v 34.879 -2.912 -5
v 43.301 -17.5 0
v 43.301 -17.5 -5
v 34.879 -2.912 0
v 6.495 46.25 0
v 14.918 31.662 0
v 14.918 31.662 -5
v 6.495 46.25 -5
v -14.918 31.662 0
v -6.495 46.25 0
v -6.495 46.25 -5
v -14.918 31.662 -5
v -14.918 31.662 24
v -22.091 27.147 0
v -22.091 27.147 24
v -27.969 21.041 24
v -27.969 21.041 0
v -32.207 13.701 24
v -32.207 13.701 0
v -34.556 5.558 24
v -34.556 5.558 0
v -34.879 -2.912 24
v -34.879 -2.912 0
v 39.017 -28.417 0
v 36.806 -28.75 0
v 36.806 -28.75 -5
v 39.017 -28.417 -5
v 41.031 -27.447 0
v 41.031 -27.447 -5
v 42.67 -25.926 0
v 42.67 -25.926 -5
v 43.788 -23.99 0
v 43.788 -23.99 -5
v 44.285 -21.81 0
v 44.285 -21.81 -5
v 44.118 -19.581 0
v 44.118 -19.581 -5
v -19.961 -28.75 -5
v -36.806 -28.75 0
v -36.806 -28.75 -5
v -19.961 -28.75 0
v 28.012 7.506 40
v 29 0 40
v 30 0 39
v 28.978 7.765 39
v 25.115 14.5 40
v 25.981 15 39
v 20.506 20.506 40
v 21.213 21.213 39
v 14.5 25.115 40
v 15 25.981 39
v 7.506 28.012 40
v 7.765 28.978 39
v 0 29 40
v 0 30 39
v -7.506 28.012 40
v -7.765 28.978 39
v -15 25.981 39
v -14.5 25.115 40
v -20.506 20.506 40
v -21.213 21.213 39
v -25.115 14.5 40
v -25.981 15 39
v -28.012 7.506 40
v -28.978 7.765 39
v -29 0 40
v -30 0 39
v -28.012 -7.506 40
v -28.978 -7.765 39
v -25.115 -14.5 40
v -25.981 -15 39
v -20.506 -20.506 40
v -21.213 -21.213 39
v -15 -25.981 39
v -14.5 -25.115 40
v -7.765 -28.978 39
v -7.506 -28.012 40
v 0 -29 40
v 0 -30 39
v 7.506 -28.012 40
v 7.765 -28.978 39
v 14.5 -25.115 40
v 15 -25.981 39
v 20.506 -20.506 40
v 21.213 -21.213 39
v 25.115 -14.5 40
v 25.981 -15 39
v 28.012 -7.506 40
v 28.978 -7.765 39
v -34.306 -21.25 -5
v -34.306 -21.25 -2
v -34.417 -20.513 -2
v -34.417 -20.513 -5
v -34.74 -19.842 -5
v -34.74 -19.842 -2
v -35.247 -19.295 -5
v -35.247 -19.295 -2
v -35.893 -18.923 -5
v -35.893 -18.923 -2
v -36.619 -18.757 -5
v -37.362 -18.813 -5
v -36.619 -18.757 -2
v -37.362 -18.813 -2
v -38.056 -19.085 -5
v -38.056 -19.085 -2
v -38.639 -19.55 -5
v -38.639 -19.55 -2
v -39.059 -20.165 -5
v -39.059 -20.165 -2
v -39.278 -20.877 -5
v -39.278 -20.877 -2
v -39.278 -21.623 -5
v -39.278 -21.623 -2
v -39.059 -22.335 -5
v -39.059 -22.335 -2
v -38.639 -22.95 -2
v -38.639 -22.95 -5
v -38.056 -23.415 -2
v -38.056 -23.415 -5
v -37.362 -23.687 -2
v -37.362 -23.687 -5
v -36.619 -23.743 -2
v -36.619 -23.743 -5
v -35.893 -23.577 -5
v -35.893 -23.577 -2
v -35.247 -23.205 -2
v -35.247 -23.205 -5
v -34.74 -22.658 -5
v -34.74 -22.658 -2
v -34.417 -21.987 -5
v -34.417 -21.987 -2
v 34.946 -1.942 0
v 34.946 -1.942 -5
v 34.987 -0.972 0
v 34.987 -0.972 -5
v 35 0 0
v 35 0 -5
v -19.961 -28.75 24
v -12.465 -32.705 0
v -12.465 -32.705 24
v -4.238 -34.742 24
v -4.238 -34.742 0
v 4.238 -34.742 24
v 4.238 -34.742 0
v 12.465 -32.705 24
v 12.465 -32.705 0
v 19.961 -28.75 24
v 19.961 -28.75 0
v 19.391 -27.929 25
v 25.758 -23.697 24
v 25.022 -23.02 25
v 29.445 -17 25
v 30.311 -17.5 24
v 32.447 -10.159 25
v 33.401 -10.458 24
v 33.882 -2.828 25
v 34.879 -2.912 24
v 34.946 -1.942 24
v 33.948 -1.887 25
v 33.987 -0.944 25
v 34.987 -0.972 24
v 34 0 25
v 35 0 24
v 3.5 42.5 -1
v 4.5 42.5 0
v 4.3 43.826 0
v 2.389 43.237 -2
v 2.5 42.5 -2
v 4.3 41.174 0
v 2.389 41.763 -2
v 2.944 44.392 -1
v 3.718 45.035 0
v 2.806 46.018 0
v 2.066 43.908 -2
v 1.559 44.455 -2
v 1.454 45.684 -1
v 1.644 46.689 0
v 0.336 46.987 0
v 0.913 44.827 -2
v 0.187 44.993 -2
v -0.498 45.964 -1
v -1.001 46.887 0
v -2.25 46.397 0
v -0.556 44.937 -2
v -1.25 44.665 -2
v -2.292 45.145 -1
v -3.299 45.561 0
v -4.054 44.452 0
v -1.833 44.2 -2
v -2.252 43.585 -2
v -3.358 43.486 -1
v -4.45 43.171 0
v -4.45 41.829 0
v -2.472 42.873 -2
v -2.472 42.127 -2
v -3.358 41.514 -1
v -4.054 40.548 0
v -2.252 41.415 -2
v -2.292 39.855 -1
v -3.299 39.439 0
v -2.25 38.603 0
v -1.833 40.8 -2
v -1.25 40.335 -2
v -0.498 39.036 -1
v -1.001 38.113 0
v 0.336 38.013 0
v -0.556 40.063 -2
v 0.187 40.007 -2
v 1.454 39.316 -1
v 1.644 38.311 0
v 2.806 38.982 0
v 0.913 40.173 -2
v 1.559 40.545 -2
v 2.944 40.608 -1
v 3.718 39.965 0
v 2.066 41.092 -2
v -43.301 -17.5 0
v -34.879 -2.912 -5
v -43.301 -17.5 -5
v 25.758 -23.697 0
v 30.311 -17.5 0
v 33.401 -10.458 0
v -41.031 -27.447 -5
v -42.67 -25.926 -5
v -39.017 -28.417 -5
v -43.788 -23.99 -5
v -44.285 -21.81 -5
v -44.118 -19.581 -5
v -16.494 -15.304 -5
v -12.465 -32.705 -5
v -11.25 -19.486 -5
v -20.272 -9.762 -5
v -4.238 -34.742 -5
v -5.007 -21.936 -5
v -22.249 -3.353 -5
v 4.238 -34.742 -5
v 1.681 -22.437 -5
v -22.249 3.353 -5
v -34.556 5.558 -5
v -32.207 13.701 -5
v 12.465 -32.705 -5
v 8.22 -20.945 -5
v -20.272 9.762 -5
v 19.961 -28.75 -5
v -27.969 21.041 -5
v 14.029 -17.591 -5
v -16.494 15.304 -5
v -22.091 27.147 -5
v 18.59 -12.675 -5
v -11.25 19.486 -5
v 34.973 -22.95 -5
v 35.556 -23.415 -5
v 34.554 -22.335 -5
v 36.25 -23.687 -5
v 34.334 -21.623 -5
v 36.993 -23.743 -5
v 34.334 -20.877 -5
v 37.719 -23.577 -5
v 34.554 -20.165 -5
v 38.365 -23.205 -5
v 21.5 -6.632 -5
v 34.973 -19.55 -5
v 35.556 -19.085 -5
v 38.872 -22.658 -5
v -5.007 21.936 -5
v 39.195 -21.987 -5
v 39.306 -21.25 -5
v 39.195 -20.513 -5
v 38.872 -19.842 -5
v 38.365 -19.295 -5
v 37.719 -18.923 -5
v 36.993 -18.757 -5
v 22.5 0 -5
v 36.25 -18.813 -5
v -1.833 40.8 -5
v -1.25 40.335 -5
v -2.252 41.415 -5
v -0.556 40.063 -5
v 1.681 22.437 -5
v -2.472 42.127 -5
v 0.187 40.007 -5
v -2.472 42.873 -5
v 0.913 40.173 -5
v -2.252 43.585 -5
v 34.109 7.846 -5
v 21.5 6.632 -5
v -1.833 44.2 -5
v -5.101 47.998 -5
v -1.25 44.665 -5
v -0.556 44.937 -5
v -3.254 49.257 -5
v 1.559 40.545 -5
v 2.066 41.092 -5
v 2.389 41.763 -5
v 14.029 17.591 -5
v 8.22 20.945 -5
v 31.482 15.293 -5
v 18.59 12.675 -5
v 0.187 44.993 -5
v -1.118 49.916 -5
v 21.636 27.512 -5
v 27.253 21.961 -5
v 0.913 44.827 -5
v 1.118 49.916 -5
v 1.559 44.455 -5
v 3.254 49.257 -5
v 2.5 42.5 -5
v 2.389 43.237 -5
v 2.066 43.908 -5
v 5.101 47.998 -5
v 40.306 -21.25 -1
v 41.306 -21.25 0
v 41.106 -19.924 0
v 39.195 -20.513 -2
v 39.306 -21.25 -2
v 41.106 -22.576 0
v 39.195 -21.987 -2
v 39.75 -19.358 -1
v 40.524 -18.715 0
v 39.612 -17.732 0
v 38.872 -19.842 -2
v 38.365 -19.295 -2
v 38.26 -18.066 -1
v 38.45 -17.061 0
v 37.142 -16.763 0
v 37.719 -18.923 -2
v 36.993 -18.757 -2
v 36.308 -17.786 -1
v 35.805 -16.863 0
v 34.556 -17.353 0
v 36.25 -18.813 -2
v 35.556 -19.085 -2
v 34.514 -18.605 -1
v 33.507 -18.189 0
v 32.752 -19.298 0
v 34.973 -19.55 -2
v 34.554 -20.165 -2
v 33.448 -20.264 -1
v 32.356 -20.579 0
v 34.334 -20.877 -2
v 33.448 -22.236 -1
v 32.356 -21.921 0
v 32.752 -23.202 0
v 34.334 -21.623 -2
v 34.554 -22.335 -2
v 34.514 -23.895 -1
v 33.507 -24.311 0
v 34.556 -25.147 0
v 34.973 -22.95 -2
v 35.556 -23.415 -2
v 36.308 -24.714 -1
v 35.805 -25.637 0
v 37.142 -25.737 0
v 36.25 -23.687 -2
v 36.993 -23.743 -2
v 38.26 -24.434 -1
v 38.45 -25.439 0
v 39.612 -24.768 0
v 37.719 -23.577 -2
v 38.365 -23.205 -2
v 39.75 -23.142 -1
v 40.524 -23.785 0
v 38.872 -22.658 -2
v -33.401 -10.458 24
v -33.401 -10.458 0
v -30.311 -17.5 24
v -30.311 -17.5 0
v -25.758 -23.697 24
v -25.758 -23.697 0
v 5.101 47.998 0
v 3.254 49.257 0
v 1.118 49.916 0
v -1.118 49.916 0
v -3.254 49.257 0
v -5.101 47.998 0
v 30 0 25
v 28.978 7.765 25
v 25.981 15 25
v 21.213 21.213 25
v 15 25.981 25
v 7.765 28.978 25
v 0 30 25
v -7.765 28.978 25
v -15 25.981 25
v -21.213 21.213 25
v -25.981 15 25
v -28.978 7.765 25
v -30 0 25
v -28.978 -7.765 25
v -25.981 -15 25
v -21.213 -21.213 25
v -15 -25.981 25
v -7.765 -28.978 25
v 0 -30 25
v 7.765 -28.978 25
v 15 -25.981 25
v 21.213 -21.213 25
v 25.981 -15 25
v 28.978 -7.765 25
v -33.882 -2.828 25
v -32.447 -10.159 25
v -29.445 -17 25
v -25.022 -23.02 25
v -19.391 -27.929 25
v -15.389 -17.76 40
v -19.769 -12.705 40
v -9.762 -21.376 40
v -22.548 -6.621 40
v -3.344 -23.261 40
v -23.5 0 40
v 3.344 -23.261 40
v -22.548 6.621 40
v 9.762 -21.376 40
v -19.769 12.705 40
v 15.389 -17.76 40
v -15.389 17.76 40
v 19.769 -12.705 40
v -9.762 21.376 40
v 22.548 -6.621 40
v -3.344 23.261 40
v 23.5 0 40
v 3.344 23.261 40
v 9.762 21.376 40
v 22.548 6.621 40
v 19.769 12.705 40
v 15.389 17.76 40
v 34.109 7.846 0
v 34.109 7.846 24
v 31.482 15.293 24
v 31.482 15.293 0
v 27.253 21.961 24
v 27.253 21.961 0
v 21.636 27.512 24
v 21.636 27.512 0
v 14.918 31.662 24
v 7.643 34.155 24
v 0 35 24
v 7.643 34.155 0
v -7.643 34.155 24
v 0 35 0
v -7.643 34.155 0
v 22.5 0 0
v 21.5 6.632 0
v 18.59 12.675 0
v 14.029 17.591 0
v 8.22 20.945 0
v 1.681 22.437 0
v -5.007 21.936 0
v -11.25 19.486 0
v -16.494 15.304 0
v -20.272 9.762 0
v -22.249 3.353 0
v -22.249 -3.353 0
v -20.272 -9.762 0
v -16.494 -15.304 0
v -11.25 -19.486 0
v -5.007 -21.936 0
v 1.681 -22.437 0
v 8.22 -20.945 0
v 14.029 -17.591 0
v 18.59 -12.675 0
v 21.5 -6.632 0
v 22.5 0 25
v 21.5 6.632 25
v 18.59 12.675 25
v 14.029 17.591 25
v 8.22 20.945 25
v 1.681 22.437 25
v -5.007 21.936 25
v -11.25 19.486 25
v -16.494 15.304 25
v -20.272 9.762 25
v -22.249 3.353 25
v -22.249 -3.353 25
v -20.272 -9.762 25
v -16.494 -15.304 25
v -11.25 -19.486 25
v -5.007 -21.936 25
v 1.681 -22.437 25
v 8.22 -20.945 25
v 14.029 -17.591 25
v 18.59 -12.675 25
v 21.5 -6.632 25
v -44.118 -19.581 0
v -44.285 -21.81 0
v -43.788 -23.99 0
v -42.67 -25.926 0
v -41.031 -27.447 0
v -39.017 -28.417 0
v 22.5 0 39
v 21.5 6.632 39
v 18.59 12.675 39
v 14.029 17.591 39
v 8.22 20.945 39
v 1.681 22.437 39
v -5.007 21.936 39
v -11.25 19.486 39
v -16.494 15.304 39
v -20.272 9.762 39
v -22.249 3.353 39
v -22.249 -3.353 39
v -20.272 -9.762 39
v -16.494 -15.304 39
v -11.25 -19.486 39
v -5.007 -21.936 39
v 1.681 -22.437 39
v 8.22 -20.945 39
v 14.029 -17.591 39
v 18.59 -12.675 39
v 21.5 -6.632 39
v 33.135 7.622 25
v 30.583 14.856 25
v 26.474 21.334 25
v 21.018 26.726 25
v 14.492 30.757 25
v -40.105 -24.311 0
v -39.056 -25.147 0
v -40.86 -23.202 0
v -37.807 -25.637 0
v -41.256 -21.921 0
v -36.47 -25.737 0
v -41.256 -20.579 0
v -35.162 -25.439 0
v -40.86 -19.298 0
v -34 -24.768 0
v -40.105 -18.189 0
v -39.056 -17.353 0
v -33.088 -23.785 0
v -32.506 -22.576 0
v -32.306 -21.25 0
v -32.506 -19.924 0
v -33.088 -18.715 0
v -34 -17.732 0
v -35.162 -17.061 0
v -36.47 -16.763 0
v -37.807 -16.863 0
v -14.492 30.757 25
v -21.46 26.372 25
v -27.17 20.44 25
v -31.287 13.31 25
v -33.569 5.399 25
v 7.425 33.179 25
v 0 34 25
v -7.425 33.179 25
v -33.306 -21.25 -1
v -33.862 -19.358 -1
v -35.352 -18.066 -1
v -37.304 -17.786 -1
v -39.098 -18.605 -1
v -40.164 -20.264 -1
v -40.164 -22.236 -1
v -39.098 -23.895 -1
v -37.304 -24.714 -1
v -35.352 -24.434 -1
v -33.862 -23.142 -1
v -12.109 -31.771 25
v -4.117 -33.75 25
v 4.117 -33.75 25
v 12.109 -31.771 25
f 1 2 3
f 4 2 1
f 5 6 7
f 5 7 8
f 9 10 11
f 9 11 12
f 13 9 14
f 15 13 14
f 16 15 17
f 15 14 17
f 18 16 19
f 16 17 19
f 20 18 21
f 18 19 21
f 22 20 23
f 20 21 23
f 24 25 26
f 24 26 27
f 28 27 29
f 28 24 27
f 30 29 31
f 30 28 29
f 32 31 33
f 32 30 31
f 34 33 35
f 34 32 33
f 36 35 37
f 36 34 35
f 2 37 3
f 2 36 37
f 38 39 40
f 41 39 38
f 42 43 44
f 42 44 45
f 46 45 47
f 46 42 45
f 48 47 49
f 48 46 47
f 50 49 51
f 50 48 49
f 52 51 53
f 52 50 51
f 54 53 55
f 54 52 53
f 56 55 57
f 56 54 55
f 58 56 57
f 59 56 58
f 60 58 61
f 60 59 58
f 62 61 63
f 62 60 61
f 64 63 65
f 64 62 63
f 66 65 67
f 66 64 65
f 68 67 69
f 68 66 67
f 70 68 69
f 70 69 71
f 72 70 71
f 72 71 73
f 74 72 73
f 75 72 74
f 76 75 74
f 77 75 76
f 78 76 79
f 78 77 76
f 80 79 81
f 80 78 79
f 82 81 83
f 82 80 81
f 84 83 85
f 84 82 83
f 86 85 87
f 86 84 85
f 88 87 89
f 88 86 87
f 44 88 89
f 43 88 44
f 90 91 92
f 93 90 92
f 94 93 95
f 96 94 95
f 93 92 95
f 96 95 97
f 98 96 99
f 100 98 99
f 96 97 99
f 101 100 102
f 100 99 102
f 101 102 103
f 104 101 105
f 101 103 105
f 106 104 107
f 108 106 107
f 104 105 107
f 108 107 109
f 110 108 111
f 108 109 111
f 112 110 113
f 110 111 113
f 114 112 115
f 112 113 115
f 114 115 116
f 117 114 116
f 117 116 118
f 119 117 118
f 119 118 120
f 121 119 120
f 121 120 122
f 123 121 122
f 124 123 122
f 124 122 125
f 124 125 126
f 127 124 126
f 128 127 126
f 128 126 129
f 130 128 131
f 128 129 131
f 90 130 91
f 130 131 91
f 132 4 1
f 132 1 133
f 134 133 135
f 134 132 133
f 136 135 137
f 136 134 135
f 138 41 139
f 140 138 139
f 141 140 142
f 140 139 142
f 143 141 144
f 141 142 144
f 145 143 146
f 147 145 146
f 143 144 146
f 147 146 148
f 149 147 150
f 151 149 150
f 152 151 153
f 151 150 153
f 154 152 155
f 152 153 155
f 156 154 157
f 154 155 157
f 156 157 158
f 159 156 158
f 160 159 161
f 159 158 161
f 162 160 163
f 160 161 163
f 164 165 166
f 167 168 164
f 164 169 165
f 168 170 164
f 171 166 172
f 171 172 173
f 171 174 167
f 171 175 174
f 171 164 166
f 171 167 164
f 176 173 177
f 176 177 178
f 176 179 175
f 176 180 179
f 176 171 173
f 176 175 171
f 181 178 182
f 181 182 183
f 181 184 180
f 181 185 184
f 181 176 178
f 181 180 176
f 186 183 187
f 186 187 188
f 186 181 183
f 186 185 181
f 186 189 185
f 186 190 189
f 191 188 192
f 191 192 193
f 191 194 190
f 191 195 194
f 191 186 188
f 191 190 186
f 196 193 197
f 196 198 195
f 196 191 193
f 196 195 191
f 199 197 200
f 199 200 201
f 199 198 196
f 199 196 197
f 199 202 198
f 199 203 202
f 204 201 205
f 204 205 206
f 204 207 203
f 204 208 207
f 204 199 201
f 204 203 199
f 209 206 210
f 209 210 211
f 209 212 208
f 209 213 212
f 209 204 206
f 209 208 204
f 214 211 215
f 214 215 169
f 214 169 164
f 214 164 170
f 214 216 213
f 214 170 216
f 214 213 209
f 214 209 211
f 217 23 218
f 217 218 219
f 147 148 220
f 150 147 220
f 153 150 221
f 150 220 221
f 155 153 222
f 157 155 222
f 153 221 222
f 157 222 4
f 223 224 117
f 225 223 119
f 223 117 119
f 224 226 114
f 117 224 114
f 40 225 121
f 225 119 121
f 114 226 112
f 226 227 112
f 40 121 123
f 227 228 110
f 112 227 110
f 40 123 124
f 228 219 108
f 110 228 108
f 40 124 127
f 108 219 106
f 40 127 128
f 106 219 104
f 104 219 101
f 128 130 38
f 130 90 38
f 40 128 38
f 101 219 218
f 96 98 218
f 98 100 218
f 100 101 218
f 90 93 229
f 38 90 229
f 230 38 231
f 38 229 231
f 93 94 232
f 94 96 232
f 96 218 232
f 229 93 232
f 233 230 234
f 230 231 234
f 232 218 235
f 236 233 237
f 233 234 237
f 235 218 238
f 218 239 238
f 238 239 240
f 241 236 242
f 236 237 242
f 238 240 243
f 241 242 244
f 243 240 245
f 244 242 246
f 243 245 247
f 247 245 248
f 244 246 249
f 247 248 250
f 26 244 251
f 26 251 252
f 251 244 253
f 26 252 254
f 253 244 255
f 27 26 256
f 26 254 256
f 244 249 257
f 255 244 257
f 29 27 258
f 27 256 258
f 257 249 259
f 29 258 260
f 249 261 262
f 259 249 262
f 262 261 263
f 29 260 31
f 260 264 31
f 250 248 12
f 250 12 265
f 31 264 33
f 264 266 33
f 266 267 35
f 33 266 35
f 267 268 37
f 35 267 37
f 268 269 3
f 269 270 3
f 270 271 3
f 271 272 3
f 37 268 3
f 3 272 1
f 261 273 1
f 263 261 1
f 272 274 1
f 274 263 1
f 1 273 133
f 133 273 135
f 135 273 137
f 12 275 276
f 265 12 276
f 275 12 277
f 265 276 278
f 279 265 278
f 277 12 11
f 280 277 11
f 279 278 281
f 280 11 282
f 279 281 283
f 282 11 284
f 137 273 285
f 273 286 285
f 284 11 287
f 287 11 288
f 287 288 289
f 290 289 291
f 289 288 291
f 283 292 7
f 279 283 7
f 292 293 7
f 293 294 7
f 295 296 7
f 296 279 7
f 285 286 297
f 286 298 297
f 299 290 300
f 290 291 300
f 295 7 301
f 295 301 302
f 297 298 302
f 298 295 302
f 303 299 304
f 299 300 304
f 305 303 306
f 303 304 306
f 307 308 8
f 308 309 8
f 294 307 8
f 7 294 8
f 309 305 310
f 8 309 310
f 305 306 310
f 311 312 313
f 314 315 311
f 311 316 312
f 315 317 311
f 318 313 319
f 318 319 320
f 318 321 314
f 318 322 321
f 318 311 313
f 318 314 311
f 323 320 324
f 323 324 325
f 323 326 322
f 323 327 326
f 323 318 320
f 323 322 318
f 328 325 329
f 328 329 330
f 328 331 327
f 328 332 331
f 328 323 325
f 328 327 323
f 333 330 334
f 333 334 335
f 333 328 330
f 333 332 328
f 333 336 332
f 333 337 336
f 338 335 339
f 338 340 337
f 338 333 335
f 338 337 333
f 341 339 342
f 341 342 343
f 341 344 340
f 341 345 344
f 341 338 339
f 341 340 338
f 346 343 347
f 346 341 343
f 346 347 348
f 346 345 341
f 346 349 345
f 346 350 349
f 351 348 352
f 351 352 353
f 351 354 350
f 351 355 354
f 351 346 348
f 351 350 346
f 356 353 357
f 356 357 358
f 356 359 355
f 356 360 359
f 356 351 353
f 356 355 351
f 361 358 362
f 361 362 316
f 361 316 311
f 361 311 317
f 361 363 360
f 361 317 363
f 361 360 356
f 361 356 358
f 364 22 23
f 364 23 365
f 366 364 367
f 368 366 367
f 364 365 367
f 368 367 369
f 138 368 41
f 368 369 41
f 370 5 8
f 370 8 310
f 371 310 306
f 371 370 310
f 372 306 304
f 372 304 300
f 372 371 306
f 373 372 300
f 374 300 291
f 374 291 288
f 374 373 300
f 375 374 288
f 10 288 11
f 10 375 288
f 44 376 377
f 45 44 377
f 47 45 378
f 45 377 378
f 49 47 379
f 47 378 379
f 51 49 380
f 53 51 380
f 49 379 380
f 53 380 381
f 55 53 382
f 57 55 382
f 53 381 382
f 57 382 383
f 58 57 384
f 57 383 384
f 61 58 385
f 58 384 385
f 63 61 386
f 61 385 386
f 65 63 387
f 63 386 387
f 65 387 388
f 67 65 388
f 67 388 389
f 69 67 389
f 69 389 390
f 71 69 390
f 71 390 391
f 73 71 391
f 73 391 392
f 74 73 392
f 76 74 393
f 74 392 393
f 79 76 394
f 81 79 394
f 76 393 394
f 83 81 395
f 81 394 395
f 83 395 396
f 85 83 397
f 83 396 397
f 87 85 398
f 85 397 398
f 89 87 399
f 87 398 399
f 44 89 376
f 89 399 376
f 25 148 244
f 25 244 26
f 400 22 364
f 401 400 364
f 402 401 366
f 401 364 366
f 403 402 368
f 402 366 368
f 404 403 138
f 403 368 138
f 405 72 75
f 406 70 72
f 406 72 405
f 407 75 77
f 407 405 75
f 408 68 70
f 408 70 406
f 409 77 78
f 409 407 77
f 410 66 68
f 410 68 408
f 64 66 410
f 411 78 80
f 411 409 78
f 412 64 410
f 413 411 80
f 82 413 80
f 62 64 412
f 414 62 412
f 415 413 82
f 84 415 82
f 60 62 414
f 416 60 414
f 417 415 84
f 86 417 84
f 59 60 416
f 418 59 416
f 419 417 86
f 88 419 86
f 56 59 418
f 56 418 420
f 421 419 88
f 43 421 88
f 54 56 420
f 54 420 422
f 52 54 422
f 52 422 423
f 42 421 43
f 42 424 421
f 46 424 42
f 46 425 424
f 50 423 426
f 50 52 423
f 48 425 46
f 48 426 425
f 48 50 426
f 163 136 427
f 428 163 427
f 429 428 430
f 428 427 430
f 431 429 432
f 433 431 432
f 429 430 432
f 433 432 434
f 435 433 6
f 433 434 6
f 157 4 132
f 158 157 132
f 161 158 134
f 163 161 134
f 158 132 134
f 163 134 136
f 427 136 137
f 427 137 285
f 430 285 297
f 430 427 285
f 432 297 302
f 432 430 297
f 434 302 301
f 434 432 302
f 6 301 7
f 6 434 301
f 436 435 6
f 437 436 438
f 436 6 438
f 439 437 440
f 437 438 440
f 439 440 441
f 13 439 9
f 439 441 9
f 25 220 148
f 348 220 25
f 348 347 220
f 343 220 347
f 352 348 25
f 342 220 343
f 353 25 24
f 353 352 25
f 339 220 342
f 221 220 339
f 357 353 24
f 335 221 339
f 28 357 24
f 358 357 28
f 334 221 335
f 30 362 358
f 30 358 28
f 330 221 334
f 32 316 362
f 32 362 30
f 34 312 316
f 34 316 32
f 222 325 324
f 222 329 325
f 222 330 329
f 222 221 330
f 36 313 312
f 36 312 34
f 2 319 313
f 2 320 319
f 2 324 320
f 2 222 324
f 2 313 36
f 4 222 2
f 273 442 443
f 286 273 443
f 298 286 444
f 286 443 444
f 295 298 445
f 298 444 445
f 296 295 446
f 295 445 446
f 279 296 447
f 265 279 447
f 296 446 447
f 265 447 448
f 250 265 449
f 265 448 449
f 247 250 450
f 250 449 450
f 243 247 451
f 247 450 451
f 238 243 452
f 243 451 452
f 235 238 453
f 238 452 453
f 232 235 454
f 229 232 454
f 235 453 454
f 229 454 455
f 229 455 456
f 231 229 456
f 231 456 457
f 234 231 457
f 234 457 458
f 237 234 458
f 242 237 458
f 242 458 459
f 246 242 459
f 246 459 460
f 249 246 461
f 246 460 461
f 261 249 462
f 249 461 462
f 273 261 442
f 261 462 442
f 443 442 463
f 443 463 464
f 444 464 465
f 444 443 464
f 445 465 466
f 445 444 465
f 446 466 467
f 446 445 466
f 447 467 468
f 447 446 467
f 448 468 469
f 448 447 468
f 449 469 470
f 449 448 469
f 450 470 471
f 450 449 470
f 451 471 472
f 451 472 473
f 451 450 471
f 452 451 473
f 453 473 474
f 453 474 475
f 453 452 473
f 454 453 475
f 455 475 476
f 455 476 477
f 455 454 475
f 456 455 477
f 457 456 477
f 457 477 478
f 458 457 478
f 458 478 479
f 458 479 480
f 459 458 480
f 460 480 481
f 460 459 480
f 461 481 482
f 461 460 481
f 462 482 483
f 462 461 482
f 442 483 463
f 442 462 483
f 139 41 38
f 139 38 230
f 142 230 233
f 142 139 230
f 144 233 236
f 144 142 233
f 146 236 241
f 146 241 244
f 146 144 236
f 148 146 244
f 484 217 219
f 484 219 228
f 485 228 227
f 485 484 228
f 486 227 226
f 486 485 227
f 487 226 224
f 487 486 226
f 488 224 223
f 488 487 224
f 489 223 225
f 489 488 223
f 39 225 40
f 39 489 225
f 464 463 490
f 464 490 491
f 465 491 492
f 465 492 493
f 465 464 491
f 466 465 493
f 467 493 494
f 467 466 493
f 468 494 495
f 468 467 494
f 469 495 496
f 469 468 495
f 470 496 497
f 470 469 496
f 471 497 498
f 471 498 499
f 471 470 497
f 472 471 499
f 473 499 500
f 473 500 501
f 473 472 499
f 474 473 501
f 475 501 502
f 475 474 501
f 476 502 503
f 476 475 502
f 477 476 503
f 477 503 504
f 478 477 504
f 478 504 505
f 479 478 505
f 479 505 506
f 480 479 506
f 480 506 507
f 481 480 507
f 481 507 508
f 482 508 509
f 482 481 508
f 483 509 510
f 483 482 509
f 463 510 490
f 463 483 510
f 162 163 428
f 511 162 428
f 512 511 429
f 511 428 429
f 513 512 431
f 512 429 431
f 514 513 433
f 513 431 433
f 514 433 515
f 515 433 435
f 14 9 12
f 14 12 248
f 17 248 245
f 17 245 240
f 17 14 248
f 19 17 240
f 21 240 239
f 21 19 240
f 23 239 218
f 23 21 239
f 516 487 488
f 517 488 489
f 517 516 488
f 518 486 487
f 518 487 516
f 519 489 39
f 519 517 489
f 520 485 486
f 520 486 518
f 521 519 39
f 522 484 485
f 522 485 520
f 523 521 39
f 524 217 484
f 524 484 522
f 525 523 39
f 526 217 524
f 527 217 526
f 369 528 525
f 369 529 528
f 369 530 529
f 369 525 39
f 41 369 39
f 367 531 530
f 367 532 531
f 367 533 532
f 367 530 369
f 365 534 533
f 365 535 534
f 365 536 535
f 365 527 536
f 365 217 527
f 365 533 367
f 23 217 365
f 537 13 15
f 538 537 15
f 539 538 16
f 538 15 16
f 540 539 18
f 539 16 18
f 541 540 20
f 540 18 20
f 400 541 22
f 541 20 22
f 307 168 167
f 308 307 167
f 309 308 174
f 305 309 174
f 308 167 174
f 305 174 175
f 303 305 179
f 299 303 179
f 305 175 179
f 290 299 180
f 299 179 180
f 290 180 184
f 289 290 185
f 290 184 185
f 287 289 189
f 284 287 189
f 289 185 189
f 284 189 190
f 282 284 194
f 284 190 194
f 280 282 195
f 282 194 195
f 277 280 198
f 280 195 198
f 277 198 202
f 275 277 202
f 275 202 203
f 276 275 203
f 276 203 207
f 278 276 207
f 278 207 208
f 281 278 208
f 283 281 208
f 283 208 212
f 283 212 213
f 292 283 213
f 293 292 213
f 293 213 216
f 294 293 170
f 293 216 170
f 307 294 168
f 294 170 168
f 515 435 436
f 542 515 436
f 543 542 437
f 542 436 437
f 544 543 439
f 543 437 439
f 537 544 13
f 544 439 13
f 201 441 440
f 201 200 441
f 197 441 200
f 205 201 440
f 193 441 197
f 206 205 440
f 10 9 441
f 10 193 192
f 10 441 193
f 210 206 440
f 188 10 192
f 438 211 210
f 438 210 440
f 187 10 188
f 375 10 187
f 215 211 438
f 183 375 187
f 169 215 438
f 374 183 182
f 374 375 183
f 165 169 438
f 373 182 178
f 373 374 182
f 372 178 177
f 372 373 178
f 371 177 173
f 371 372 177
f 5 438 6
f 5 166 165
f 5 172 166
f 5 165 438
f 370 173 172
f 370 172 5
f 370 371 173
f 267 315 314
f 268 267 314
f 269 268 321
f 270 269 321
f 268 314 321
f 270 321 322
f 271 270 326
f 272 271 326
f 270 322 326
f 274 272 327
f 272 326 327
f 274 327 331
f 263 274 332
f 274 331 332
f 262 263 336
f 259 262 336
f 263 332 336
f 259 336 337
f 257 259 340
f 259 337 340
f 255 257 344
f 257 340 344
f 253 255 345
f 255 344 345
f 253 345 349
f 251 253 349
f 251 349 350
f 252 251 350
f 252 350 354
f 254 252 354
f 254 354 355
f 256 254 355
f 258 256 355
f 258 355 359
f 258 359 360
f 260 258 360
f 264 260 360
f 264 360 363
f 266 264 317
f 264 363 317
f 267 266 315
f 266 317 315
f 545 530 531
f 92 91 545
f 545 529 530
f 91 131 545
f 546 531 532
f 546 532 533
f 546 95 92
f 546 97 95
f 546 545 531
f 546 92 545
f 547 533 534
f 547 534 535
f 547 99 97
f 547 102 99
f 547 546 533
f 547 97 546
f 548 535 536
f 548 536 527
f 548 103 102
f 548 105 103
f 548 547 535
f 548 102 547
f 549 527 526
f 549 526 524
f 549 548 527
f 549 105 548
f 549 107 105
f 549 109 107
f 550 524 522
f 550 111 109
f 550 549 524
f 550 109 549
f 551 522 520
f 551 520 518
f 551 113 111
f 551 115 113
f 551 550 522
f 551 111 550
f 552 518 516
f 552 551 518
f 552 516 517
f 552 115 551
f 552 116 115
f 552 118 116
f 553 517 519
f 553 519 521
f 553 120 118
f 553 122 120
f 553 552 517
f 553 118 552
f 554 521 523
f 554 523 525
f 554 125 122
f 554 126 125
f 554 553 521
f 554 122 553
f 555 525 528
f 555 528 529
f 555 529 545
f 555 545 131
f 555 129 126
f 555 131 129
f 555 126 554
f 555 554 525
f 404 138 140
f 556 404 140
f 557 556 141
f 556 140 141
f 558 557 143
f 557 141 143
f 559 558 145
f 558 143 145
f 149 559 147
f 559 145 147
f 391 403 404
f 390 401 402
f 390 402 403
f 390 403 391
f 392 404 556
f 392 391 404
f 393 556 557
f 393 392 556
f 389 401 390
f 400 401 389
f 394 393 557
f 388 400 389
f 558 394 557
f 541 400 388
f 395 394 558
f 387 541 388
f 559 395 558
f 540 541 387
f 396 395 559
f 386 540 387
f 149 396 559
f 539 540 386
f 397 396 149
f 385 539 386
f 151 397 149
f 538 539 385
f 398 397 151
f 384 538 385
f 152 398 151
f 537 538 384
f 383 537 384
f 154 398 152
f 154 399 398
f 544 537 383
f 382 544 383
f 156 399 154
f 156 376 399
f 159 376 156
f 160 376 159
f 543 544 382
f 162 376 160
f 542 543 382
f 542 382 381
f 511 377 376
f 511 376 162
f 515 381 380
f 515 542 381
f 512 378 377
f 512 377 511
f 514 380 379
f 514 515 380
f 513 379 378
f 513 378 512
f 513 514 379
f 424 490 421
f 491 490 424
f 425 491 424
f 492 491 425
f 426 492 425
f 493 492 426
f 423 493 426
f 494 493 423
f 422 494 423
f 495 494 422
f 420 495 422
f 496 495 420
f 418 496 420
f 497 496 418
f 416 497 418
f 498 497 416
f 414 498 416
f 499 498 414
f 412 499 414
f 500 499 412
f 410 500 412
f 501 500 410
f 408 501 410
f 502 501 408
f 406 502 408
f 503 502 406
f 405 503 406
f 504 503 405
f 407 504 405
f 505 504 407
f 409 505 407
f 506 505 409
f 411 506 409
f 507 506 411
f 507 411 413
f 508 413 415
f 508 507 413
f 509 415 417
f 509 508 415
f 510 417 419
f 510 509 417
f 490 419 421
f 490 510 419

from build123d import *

# Parameters (mm, degrees)
F0_R     = 22.5
F1_DEPTH = 25
F0_R_2   = 2.5
F2_DEPTH = 5
F3_R     = 30
F3_R_2   = 22.5
F4_DEPTH = 15
F5_SIZE  = 1
F6_SIZE  = 2


with BuildPart() as f1:
    # F0 (on Top) → F1 (new body)
    with BuildSketch(Plane.XY):
        with BuildLine():
            ThreePointArc((34.878679998, -2.9116458574), (34.9696568465, -1.4570861455), (35, 0))
            ThreePointArc((35, 0), (29.556068118, 18.7467020408), (14.9177807196, 31.6616458574))
            ThreePointArc((14.9177807196, 31.6616458574), (0, 35), (-14.9177807196, 31.6616458574))
            ThreePointArc((-14.9177807196, 31.6616458574), (-30.3108891325, 17.5), (-34.878679998, -2.9116458574))
            ThreePointArc((-34.878679998, -2.9116458574), (-30.3108891325, -17.5), (-19.9608992783, -28.75))
            ThreePointArc((-19.9608992783, -28.75), (0, -35), (19.9608992783, -28.75))
            ThreePointArc((19.9608992783, -28.75), (30.3108891325, -17.5), (34.878679998, -2.9116458574))
        make_face()
        Circle(F0_R, mode=Mode.SUBTRACT)
    extrude(amount=F1_DEPTH)

    # F0 (on Top) → F2 (join)
    with BuildSketch(Plane.XY):
        with BuildLine():
            ThreePointArc((-19.9608992783, -28.75), (-30.3108891325, -17.5), (-34.878679998, -2.9116458574))
            Line((-34.878679998, -2.9116458574), (-43.3012701892, -17.5))
            ThreePointArc((-43.3012701892, -17.5), (-43.3012701892, -25), (-36.8060796608, -28.75))
            Line((-36.8060796608, -28.75), (-19.9608992783, -28.75))
        make_face()
        with Locations((-36.8060796608, -21.25)):
            Circle(F0_R_2, mode=Mode.SUBTRACT)
        with BuildLine():
            Line((43.3012701892, -17.5), (34.878679998, -2.9116458574))
            ThreePointArc((34.878679998, -2.9116458574), (30.3108891325, -17.5), (19.9608992783, -28.75))
            Line((19.9608992783, -28.75), (36.8060796608, -28.75))
            ThreePointArc((36.8060796608, -28.75), (43.3012701892, -25), (43.3012701892, -17.5))
        make_face()
        with Locations((36.8060796608, -21.25)):
            Circle(F0_R_2, mode=Mode.SUBTRACT)
        with BuildLine():
            ThreePointArc((-14.9177807196, 31.6616458574), (0, 35), (14.9177807196, 31.6616458574))
            Line((14.9177807196, 31.6616458574), (6.4951905284, 46.25))
            ThreePointArc((6.4951905284, 46.25), (0, 50), (-6.4951905284, 46.25))
            Line((-6.4951905284, 46.25), (-14.9177807196, 31.6616458574))
        make_face()
        with Locations((0, 42.5)):
            Circle(F0_R_2, mode=Mode.SUBTRACT)
        with BuildLine():
            ThreePointArc((34.878679998, -2.9116458574), (34.9696568465, -1.4570861455), (35, 0))
            ThreePointArc((35, 0), (29.556068118, 18.7467020408), (14.9177807196, 31.6616458574))
            ThreePointArc((14.9177807196, 31.6616458574), (0, 35), (-14.9177807196, 31.6616458574))
            ThreePointArc((-14.9177807196, 31.6616458574), (-30.3108891325, 17.5), (-34.878679998, -2.9116458574))
            ThreePointArc((-34.878679998, -2.9116458574), (-30.3108891325, -17.5), (-19.9608992783, -28.75))
            ThreePointArc((-19.9608992783, -28.75), (0, -35), (19.9608992783, -28.75))
            ThreePointArc((19.9608992783, -28.75), (30.3108891325, -17.5), (34.878679998, -2.9116458574))
        make_face()
        Circle(F0_R, mode=Mode.SUBTRACT)
    extrude(amount=-F2_DEPTH)

    # F3 (on face) → F4 (join)
    with BuildSketch(Plane.XY.offset(25)):
        Circle(F3_R)
        Circle(F3_R_2, mode=Mode.SUBTRACT)
    extrude(amount=F4_DEPTH)

    # F5
    f5_edges = [f1.edges().sort_by_distance(p)[0] for p in [
        (-22.5, 0, 40),
        (-30, 0, 40),
        (34.87868, 2.911646, 25),
    ]]
    chamfer(f5_edges, length=F5_SIZE)

    # F6
    f6_edges = [f1.edges().sort_by_distance(p)[0] for p in [
        (-2.5, 42.5, 0),
        (34.30608, -21.25, 0),
        (-39.30608, -21.25, 0),
    ]]
    chamfer(f6_edges, length=F6_SIZE)


solid = f1.part
